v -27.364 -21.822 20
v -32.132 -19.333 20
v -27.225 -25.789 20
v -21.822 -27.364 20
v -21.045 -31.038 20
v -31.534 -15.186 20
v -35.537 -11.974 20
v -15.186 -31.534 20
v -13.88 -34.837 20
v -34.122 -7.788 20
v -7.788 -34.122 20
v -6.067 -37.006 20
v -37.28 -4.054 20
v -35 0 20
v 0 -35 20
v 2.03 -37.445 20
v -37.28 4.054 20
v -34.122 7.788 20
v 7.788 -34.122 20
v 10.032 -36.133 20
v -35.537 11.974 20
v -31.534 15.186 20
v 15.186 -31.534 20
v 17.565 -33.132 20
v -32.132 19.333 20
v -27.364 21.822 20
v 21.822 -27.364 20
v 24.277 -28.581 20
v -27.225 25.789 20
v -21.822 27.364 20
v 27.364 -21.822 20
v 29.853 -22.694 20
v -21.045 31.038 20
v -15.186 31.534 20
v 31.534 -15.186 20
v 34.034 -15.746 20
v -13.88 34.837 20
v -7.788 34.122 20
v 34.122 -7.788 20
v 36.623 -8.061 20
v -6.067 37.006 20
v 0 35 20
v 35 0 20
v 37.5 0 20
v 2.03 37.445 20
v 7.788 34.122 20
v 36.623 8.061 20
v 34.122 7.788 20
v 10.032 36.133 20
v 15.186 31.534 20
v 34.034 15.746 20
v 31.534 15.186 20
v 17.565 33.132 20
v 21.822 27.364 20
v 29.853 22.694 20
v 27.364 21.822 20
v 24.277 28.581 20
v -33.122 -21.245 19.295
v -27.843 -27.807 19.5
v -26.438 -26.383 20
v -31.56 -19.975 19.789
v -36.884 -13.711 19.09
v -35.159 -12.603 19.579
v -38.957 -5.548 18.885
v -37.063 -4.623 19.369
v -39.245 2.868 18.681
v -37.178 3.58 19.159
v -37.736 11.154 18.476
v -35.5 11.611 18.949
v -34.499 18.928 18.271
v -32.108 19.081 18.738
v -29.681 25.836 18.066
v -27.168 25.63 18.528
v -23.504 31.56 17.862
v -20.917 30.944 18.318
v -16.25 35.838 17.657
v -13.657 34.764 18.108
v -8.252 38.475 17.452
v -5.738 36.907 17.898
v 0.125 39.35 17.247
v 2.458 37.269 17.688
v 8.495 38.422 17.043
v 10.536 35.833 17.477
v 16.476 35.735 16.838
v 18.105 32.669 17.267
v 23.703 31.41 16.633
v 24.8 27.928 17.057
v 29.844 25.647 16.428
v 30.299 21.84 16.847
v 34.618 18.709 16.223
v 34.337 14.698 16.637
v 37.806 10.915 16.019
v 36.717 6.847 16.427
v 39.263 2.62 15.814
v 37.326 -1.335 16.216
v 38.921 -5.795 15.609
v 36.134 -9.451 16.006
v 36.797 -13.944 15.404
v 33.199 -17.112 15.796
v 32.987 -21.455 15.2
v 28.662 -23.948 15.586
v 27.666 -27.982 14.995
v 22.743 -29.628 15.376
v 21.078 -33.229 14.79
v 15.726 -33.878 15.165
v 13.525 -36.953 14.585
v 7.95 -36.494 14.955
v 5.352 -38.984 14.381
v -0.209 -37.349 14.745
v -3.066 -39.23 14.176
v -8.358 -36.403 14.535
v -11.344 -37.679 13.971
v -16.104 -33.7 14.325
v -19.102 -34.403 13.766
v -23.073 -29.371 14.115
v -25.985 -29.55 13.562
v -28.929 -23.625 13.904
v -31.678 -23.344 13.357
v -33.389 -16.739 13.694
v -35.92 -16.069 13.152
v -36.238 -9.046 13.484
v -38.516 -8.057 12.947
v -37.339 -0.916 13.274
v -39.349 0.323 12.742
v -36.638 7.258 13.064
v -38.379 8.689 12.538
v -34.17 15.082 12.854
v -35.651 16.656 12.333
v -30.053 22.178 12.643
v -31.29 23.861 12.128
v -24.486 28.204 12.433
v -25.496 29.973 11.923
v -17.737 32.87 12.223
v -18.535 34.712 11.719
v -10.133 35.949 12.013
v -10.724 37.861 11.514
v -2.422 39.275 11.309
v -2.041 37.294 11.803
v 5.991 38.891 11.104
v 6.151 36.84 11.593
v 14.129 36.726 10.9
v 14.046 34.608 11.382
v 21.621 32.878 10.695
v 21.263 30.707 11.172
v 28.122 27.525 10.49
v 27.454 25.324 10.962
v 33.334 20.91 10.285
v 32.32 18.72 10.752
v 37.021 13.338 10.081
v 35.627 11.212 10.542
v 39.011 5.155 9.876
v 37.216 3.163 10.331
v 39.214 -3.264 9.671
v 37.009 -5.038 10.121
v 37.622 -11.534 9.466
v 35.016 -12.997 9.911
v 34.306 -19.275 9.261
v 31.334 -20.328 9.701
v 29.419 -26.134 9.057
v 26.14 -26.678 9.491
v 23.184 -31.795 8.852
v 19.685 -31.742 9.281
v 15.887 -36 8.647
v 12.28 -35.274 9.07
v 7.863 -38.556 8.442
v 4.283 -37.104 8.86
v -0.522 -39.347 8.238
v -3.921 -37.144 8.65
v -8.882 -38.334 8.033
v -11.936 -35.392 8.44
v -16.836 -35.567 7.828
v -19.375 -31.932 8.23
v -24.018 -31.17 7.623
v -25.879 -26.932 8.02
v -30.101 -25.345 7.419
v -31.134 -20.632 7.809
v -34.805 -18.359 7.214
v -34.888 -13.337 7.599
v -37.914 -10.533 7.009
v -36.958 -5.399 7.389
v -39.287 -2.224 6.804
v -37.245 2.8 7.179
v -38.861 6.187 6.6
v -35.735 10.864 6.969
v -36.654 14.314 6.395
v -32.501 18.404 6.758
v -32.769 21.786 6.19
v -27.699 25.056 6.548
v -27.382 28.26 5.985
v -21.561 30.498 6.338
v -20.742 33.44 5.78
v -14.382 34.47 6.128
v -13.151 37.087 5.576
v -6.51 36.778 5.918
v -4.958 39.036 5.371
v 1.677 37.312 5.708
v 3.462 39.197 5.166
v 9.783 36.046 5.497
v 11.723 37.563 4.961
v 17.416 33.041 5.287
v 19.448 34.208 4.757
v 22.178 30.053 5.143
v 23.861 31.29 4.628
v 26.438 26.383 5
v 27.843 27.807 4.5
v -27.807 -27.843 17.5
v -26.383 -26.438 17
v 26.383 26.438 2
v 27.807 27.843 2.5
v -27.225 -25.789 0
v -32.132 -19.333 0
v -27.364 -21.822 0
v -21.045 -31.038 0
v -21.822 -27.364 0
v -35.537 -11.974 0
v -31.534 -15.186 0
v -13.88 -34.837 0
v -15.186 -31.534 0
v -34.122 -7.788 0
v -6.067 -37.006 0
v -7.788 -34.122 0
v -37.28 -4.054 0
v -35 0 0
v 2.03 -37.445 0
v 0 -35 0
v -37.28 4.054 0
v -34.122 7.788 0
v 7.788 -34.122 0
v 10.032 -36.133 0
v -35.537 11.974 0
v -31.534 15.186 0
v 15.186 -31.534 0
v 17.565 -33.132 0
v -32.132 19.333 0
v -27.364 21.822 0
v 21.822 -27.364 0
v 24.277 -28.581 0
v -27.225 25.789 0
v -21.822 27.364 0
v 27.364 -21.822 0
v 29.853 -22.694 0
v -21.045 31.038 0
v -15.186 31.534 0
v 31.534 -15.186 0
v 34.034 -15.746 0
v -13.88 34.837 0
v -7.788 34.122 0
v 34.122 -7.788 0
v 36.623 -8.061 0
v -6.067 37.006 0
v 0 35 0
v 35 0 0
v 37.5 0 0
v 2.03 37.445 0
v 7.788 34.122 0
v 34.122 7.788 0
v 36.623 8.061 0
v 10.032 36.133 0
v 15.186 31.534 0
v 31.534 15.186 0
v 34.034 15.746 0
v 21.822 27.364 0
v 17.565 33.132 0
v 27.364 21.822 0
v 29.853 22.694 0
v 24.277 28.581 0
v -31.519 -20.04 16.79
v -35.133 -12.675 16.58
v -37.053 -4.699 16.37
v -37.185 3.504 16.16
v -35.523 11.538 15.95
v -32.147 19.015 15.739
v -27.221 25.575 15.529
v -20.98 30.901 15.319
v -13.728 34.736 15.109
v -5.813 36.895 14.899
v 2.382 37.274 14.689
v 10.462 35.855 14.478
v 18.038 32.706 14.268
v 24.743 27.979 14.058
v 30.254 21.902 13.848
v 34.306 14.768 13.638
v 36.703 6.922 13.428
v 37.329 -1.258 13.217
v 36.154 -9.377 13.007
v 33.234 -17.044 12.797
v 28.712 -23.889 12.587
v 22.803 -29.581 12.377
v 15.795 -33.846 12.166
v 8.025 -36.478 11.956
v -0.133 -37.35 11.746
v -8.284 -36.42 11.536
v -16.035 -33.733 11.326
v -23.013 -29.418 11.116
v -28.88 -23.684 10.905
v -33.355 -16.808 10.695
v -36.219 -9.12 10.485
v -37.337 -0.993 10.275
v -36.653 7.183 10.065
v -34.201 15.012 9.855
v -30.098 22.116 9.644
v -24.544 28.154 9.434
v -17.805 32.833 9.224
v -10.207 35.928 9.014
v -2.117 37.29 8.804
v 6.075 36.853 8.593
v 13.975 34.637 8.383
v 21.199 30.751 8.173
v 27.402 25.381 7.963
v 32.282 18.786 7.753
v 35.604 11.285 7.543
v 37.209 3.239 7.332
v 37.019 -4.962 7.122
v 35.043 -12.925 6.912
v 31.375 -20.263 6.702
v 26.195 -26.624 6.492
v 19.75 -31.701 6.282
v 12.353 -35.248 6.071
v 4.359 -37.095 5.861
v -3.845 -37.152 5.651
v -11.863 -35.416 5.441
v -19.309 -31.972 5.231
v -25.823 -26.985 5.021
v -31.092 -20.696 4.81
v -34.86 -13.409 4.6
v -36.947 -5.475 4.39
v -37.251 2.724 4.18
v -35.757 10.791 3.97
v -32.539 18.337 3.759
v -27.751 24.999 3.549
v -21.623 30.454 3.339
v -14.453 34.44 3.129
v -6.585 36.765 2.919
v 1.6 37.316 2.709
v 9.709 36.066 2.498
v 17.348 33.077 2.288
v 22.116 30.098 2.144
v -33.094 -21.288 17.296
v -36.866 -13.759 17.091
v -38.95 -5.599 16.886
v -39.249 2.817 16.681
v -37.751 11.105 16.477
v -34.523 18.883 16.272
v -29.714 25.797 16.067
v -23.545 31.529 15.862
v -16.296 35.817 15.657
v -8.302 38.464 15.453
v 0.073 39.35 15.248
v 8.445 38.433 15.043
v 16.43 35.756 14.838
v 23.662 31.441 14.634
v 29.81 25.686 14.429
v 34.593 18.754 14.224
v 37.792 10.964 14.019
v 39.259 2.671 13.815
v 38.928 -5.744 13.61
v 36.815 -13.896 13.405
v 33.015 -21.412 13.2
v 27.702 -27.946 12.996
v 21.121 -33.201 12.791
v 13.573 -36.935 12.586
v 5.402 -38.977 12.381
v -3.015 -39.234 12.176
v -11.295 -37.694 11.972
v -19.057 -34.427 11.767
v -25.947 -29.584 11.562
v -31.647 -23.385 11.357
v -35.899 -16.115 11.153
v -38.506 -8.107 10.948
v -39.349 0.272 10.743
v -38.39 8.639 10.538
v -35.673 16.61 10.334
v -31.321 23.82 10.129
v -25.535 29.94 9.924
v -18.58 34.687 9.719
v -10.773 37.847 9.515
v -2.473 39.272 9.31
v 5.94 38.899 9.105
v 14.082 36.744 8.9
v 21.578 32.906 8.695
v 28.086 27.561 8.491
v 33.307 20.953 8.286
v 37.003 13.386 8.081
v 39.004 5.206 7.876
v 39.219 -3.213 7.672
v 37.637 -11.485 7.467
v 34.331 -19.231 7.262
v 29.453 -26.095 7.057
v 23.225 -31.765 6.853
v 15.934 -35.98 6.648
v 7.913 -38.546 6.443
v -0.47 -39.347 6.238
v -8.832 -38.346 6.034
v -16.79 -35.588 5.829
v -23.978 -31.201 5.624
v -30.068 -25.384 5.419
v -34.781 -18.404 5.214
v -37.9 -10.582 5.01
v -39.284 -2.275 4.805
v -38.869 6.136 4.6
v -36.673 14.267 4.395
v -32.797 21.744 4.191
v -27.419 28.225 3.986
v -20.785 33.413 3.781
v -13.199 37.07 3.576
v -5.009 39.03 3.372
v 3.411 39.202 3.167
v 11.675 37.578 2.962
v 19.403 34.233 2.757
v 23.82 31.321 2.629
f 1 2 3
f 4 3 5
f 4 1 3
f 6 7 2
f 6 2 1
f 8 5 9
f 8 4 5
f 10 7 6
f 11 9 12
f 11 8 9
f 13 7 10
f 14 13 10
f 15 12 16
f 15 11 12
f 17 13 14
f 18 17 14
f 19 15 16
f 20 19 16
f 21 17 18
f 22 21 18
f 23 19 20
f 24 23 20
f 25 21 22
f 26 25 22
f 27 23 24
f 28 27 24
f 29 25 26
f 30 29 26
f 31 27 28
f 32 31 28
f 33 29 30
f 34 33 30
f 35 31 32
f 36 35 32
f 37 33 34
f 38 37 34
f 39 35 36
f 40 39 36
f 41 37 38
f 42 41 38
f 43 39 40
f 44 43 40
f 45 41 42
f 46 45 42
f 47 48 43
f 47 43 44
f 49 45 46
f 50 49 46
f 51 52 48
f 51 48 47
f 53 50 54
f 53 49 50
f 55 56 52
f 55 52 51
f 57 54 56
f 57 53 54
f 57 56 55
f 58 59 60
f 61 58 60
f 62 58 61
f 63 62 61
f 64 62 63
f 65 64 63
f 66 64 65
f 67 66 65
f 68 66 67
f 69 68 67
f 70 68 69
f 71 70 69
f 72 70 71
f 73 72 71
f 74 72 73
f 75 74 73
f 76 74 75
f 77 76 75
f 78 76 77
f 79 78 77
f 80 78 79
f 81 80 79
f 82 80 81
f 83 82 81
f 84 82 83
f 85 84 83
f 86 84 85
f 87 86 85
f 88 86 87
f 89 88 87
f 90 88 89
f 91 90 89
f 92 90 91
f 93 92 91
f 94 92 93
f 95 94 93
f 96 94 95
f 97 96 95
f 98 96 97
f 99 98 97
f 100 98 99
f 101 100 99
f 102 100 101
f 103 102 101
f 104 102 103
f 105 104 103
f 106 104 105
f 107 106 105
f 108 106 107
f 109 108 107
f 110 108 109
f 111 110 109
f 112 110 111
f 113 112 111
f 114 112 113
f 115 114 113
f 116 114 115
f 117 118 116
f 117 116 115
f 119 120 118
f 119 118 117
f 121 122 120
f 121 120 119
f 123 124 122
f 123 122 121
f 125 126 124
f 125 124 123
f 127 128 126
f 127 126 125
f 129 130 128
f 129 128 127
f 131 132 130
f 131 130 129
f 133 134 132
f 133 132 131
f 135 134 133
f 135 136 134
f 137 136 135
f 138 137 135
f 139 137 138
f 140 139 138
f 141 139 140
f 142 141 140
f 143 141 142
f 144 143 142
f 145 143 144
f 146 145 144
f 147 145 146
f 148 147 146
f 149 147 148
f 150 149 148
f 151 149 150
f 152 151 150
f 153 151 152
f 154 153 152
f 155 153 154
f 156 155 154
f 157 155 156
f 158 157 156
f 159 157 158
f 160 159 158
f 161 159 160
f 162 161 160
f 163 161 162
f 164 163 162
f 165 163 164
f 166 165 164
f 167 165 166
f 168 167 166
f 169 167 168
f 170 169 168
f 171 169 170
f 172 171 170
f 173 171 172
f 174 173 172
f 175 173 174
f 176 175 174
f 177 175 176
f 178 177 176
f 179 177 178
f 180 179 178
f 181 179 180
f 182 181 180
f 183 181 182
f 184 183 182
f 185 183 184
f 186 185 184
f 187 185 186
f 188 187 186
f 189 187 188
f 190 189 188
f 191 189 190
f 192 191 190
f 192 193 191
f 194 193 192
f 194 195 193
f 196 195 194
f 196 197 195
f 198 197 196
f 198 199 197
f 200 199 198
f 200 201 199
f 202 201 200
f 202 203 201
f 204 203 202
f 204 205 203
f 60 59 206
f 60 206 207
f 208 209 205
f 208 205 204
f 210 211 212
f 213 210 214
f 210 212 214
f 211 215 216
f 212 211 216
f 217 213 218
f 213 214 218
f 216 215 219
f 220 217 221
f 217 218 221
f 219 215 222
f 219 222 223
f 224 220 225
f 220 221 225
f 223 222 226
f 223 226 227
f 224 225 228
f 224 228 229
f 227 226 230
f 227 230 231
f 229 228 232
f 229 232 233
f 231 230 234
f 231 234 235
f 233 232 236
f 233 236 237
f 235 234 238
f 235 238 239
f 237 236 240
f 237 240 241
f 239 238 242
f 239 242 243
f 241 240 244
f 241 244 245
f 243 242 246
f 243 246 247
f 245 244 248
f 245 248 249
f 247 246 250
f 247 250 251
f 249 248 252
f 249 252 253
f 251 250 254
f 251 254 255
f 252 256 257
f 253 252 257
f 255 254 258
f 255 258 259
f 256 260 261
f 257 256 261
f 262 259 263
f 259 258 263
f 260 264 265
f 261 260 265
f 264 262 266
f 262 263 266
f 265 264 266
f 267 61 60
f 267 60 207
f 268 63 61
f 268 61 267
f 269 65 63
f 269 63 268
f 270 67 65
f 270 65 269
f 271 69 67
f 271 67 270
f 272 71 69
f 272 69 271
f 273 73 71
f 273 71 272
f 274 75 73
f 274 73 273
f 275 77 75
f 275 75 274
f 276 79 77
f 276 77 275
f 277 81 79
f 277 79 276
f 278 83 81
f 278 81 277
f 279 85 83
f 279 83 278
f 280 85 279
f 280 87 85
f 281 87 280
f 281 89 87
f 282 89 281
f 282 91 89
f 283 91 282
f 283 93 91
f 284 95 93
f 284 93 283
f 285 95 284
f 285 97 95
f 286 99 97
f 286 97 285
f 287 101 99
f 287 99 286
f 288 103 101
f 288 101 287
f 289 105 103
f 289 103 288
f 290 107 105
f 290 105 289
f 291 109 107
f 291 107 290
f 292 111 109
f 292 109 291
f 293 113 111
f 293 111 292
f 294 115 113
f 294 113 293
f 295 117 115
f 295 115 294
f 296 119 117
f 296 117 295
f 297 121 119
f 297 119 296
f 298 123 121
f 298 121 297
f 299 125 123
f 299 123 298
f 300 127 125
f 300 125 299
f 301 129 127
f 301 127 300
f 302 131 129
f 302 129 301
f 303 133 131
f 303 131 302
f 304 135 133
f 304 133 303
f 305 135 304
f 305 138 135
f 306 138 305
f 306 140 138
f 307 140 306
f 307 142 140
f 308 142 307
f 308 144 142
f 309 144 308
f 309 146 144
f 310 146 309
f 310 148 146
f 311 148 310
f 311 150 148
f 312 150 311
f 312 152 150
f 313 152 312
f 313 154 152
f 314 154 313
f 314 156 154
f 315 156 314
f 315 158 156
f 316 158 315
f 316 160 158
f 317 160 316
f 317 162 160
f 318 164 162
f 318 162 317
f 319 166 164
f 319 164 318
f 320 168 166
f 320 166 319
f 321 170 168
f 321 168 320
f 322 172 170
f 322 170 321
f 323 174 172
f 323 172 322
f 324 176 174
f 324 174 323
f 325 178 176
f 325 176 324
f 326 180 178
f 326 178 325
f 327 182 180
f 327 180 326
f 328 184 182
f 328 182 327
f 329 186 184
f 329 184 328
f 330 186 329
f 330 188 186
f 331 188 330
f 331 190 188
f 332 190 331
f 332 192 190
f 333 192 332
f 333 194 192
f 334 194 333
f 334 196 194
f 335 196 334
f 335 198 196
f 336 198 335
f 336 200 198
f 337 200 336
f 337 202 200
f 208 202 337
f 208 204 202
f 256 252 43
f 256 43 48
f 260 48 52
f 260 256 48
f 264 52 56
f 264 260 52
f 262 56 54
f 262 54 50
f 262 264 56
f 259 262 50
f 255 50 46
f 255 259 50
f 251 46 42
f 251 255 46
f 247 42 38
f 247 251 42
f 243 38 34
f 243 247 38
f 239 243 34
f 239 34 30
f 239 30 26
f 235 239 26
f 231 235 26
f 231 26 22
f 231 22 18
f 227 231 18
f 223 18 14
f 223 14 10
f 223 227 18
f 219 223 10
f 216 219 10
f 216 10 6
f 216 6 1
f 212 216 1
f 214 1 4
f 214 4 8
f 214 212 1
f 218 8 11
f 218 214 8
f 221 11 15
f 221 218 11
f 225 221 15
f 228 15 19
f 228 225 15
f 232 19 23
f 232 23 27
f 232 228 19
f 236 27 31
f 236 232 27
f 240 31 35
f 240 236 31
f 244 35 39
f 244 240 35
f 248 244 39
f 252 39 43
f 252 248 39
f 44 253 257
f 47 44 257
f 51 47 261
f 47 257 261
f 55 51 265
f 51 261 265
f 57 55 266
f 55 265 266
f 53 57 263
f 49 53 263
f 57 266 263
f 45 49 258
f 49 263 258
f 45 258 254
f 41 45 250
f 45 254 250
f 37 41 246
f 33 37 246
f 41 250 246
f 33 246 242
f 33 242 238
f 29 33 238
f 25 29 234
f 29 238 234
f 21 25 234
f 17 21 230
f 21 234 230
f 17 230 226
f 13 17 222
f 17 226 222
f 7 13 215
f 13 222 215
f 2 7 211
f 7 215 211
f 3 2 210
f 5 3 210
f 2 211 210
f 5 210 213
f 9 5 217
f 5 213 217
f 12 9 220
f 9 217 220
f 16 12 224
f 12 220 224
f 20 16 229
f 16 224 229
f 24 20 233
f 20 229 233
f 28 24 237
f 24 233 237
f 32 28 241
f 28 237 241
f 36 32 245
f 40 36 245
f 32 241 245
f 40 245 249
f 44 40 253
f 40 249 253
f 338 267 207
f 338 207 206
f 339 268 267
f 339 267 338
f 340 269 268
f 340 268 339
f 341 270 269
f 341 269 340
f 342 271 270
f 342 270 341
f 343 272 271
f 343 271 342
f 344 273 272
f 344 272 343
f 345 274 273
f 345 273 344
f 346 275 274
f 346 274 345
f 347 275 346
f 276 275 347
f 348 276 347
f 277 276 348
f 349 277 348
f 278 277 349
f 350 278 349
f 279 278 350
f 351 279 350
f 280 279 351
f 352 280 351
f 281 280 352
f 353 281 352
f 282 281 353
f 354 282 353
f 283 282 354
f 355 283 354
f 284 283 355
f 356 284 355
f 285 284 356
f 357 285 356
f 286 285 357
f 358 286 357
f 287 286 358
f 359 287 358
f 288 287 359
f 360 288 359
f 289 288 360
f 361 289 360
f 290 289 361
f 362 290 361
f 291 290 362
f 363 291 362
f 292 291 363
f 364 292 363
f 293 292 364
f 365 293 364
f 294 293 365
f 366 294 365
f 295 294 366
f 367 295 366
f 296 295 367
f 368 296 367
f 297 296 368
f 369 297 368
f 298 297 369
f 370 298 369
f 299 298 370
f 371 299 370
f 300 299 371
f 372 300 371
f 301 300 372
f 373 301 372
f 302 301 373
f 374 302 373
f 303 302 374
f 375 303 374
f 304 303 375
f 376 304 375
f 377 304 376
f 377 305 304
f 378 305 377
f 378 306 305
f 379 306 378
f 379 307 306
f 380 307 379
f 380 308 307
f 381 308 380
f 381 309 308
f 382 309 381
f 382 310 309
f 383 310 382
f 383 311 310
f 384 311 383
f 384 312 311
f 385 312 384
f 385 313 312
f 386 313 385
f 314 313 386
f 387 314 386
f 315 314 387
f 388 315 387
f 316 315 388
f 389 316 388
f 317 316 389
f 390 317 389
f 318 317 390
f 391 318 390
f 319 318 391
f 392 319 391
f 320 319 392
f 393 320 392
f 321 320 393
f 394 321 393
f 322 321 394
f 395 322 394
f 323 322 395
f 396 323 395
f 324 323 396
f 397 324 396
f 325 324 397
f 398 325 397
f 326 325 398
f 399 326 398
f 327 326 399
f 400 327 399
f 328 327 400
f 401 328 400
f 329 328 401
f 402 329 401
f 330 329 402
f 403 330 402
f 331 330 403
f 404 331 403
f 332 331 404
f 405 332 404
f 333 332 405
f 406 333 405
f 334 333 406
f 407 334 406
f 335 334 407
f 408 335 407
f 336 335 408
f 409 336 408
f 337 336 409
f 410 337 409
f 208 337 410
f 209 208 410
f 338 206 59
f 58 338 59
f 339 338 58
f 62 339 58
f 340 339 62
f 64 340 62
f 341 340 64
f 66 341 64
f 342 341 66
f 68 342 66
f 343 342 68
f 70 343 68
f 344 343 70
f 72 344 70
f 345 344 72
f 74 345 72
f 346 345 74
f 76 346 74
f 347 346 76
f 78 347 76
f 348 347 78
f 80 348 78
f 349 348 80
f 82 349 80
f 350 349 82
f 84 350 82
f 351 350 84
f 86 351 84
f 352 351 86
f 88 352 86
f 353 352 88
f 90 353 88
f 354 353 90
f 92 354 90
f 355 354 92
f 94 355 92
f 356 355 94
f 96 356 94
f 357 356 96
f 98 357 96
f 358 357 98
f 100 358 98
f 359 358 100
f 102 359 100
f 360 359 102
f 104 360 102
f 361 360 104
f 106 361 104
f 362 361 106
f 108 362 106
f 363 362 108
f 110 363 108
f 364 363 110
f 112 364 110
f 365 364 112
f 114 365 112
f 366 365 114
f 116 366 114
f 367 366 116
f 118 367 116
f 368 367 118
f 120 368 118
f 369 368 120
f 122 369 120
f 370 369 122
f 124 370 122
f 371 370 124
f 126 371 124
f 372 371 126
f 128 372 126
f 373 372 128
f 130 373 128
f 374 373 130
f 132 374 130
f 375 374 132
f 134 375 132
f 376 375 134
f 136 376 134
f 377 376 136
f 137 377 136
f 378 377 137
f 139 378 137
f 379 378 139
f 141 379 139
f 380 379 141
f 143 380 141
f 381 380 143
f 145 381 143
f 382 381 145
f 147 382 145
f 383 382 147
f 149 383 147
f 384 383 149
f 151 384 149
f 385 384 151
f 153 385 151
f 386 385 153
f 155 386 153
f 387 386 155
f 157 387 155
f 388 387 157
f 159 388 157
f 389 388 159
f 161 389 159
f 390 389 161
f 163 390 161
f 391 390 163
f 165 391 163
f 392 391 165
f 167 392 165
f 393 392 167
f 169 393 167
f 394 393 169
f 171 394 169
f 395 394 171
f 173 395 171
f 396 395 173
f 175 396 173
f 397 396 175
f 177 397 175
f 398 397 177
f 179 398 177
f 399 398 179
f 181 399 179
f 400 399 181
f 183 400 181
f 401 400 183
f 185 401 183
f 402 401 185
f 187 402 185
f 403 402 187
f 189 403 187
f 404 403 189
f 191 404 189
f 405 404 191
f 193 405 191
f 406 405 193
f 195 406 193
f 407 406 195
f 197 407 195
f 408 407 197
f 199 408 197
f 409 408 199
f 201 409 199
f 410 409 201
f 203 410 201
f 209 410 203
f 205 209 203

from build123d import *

# Parameters (mm, degrees)
SKETCH_1_R          = 37.5
SKETCH_1_R_2        = 35
EXTRUDE_1_DEPTH     = 20
SWEEP_1_PITCH       = 6
SWEEP_1_HEIGHT      = 15
SWEEP_1_RADIUS      = 37.35
SWEEP_1_START_ANGLE = -45


with BuildPart() as part:
    # 草图1 → 凸台-拉伸1 (new body)
    with BuildSketch(Plane.XY):
        Circle(SKETCH_1_R)
        Circle(SKETCH_1_R_2, mode=Mode.SUBTRACT)
    extrude(amount=EXTRUDE_1_DEPTH)


with BuildPart() as body_2:
    # 扫描1: sweep along a helix
    with BuildLine() as sweep_1_path:
        add(Helix(SWEEP_1_PITCH, SWEEP_1_HEIGHT, SWEEP_1_RADIUS, center=(0, 0, 18.5), direction=(0, 0, -1), mode=Mode.PRIVATE).rotate(Axis((0, 0, 18.5), (0, 0, -1)), SWEEP_1_START_ANGLE))
    # 草图6 → 扫描1 (sweep)
    with BuildSketch(Plane(origin=(-26.410438277, -26.410438277, 18.5), x_dir=(-0.018072735, 0.018072735, 0.999673323), z_dir=(-0.706875786, 0.706875786, -0.025558707))):
        Polygon((1.5, 0), (-1.5, 0), (-1, -2), (1, -2), align=None)
    sweep(path=sweep_1_path.line, is_frenet=True)


solid = Compound([part.part, body_2.part])
